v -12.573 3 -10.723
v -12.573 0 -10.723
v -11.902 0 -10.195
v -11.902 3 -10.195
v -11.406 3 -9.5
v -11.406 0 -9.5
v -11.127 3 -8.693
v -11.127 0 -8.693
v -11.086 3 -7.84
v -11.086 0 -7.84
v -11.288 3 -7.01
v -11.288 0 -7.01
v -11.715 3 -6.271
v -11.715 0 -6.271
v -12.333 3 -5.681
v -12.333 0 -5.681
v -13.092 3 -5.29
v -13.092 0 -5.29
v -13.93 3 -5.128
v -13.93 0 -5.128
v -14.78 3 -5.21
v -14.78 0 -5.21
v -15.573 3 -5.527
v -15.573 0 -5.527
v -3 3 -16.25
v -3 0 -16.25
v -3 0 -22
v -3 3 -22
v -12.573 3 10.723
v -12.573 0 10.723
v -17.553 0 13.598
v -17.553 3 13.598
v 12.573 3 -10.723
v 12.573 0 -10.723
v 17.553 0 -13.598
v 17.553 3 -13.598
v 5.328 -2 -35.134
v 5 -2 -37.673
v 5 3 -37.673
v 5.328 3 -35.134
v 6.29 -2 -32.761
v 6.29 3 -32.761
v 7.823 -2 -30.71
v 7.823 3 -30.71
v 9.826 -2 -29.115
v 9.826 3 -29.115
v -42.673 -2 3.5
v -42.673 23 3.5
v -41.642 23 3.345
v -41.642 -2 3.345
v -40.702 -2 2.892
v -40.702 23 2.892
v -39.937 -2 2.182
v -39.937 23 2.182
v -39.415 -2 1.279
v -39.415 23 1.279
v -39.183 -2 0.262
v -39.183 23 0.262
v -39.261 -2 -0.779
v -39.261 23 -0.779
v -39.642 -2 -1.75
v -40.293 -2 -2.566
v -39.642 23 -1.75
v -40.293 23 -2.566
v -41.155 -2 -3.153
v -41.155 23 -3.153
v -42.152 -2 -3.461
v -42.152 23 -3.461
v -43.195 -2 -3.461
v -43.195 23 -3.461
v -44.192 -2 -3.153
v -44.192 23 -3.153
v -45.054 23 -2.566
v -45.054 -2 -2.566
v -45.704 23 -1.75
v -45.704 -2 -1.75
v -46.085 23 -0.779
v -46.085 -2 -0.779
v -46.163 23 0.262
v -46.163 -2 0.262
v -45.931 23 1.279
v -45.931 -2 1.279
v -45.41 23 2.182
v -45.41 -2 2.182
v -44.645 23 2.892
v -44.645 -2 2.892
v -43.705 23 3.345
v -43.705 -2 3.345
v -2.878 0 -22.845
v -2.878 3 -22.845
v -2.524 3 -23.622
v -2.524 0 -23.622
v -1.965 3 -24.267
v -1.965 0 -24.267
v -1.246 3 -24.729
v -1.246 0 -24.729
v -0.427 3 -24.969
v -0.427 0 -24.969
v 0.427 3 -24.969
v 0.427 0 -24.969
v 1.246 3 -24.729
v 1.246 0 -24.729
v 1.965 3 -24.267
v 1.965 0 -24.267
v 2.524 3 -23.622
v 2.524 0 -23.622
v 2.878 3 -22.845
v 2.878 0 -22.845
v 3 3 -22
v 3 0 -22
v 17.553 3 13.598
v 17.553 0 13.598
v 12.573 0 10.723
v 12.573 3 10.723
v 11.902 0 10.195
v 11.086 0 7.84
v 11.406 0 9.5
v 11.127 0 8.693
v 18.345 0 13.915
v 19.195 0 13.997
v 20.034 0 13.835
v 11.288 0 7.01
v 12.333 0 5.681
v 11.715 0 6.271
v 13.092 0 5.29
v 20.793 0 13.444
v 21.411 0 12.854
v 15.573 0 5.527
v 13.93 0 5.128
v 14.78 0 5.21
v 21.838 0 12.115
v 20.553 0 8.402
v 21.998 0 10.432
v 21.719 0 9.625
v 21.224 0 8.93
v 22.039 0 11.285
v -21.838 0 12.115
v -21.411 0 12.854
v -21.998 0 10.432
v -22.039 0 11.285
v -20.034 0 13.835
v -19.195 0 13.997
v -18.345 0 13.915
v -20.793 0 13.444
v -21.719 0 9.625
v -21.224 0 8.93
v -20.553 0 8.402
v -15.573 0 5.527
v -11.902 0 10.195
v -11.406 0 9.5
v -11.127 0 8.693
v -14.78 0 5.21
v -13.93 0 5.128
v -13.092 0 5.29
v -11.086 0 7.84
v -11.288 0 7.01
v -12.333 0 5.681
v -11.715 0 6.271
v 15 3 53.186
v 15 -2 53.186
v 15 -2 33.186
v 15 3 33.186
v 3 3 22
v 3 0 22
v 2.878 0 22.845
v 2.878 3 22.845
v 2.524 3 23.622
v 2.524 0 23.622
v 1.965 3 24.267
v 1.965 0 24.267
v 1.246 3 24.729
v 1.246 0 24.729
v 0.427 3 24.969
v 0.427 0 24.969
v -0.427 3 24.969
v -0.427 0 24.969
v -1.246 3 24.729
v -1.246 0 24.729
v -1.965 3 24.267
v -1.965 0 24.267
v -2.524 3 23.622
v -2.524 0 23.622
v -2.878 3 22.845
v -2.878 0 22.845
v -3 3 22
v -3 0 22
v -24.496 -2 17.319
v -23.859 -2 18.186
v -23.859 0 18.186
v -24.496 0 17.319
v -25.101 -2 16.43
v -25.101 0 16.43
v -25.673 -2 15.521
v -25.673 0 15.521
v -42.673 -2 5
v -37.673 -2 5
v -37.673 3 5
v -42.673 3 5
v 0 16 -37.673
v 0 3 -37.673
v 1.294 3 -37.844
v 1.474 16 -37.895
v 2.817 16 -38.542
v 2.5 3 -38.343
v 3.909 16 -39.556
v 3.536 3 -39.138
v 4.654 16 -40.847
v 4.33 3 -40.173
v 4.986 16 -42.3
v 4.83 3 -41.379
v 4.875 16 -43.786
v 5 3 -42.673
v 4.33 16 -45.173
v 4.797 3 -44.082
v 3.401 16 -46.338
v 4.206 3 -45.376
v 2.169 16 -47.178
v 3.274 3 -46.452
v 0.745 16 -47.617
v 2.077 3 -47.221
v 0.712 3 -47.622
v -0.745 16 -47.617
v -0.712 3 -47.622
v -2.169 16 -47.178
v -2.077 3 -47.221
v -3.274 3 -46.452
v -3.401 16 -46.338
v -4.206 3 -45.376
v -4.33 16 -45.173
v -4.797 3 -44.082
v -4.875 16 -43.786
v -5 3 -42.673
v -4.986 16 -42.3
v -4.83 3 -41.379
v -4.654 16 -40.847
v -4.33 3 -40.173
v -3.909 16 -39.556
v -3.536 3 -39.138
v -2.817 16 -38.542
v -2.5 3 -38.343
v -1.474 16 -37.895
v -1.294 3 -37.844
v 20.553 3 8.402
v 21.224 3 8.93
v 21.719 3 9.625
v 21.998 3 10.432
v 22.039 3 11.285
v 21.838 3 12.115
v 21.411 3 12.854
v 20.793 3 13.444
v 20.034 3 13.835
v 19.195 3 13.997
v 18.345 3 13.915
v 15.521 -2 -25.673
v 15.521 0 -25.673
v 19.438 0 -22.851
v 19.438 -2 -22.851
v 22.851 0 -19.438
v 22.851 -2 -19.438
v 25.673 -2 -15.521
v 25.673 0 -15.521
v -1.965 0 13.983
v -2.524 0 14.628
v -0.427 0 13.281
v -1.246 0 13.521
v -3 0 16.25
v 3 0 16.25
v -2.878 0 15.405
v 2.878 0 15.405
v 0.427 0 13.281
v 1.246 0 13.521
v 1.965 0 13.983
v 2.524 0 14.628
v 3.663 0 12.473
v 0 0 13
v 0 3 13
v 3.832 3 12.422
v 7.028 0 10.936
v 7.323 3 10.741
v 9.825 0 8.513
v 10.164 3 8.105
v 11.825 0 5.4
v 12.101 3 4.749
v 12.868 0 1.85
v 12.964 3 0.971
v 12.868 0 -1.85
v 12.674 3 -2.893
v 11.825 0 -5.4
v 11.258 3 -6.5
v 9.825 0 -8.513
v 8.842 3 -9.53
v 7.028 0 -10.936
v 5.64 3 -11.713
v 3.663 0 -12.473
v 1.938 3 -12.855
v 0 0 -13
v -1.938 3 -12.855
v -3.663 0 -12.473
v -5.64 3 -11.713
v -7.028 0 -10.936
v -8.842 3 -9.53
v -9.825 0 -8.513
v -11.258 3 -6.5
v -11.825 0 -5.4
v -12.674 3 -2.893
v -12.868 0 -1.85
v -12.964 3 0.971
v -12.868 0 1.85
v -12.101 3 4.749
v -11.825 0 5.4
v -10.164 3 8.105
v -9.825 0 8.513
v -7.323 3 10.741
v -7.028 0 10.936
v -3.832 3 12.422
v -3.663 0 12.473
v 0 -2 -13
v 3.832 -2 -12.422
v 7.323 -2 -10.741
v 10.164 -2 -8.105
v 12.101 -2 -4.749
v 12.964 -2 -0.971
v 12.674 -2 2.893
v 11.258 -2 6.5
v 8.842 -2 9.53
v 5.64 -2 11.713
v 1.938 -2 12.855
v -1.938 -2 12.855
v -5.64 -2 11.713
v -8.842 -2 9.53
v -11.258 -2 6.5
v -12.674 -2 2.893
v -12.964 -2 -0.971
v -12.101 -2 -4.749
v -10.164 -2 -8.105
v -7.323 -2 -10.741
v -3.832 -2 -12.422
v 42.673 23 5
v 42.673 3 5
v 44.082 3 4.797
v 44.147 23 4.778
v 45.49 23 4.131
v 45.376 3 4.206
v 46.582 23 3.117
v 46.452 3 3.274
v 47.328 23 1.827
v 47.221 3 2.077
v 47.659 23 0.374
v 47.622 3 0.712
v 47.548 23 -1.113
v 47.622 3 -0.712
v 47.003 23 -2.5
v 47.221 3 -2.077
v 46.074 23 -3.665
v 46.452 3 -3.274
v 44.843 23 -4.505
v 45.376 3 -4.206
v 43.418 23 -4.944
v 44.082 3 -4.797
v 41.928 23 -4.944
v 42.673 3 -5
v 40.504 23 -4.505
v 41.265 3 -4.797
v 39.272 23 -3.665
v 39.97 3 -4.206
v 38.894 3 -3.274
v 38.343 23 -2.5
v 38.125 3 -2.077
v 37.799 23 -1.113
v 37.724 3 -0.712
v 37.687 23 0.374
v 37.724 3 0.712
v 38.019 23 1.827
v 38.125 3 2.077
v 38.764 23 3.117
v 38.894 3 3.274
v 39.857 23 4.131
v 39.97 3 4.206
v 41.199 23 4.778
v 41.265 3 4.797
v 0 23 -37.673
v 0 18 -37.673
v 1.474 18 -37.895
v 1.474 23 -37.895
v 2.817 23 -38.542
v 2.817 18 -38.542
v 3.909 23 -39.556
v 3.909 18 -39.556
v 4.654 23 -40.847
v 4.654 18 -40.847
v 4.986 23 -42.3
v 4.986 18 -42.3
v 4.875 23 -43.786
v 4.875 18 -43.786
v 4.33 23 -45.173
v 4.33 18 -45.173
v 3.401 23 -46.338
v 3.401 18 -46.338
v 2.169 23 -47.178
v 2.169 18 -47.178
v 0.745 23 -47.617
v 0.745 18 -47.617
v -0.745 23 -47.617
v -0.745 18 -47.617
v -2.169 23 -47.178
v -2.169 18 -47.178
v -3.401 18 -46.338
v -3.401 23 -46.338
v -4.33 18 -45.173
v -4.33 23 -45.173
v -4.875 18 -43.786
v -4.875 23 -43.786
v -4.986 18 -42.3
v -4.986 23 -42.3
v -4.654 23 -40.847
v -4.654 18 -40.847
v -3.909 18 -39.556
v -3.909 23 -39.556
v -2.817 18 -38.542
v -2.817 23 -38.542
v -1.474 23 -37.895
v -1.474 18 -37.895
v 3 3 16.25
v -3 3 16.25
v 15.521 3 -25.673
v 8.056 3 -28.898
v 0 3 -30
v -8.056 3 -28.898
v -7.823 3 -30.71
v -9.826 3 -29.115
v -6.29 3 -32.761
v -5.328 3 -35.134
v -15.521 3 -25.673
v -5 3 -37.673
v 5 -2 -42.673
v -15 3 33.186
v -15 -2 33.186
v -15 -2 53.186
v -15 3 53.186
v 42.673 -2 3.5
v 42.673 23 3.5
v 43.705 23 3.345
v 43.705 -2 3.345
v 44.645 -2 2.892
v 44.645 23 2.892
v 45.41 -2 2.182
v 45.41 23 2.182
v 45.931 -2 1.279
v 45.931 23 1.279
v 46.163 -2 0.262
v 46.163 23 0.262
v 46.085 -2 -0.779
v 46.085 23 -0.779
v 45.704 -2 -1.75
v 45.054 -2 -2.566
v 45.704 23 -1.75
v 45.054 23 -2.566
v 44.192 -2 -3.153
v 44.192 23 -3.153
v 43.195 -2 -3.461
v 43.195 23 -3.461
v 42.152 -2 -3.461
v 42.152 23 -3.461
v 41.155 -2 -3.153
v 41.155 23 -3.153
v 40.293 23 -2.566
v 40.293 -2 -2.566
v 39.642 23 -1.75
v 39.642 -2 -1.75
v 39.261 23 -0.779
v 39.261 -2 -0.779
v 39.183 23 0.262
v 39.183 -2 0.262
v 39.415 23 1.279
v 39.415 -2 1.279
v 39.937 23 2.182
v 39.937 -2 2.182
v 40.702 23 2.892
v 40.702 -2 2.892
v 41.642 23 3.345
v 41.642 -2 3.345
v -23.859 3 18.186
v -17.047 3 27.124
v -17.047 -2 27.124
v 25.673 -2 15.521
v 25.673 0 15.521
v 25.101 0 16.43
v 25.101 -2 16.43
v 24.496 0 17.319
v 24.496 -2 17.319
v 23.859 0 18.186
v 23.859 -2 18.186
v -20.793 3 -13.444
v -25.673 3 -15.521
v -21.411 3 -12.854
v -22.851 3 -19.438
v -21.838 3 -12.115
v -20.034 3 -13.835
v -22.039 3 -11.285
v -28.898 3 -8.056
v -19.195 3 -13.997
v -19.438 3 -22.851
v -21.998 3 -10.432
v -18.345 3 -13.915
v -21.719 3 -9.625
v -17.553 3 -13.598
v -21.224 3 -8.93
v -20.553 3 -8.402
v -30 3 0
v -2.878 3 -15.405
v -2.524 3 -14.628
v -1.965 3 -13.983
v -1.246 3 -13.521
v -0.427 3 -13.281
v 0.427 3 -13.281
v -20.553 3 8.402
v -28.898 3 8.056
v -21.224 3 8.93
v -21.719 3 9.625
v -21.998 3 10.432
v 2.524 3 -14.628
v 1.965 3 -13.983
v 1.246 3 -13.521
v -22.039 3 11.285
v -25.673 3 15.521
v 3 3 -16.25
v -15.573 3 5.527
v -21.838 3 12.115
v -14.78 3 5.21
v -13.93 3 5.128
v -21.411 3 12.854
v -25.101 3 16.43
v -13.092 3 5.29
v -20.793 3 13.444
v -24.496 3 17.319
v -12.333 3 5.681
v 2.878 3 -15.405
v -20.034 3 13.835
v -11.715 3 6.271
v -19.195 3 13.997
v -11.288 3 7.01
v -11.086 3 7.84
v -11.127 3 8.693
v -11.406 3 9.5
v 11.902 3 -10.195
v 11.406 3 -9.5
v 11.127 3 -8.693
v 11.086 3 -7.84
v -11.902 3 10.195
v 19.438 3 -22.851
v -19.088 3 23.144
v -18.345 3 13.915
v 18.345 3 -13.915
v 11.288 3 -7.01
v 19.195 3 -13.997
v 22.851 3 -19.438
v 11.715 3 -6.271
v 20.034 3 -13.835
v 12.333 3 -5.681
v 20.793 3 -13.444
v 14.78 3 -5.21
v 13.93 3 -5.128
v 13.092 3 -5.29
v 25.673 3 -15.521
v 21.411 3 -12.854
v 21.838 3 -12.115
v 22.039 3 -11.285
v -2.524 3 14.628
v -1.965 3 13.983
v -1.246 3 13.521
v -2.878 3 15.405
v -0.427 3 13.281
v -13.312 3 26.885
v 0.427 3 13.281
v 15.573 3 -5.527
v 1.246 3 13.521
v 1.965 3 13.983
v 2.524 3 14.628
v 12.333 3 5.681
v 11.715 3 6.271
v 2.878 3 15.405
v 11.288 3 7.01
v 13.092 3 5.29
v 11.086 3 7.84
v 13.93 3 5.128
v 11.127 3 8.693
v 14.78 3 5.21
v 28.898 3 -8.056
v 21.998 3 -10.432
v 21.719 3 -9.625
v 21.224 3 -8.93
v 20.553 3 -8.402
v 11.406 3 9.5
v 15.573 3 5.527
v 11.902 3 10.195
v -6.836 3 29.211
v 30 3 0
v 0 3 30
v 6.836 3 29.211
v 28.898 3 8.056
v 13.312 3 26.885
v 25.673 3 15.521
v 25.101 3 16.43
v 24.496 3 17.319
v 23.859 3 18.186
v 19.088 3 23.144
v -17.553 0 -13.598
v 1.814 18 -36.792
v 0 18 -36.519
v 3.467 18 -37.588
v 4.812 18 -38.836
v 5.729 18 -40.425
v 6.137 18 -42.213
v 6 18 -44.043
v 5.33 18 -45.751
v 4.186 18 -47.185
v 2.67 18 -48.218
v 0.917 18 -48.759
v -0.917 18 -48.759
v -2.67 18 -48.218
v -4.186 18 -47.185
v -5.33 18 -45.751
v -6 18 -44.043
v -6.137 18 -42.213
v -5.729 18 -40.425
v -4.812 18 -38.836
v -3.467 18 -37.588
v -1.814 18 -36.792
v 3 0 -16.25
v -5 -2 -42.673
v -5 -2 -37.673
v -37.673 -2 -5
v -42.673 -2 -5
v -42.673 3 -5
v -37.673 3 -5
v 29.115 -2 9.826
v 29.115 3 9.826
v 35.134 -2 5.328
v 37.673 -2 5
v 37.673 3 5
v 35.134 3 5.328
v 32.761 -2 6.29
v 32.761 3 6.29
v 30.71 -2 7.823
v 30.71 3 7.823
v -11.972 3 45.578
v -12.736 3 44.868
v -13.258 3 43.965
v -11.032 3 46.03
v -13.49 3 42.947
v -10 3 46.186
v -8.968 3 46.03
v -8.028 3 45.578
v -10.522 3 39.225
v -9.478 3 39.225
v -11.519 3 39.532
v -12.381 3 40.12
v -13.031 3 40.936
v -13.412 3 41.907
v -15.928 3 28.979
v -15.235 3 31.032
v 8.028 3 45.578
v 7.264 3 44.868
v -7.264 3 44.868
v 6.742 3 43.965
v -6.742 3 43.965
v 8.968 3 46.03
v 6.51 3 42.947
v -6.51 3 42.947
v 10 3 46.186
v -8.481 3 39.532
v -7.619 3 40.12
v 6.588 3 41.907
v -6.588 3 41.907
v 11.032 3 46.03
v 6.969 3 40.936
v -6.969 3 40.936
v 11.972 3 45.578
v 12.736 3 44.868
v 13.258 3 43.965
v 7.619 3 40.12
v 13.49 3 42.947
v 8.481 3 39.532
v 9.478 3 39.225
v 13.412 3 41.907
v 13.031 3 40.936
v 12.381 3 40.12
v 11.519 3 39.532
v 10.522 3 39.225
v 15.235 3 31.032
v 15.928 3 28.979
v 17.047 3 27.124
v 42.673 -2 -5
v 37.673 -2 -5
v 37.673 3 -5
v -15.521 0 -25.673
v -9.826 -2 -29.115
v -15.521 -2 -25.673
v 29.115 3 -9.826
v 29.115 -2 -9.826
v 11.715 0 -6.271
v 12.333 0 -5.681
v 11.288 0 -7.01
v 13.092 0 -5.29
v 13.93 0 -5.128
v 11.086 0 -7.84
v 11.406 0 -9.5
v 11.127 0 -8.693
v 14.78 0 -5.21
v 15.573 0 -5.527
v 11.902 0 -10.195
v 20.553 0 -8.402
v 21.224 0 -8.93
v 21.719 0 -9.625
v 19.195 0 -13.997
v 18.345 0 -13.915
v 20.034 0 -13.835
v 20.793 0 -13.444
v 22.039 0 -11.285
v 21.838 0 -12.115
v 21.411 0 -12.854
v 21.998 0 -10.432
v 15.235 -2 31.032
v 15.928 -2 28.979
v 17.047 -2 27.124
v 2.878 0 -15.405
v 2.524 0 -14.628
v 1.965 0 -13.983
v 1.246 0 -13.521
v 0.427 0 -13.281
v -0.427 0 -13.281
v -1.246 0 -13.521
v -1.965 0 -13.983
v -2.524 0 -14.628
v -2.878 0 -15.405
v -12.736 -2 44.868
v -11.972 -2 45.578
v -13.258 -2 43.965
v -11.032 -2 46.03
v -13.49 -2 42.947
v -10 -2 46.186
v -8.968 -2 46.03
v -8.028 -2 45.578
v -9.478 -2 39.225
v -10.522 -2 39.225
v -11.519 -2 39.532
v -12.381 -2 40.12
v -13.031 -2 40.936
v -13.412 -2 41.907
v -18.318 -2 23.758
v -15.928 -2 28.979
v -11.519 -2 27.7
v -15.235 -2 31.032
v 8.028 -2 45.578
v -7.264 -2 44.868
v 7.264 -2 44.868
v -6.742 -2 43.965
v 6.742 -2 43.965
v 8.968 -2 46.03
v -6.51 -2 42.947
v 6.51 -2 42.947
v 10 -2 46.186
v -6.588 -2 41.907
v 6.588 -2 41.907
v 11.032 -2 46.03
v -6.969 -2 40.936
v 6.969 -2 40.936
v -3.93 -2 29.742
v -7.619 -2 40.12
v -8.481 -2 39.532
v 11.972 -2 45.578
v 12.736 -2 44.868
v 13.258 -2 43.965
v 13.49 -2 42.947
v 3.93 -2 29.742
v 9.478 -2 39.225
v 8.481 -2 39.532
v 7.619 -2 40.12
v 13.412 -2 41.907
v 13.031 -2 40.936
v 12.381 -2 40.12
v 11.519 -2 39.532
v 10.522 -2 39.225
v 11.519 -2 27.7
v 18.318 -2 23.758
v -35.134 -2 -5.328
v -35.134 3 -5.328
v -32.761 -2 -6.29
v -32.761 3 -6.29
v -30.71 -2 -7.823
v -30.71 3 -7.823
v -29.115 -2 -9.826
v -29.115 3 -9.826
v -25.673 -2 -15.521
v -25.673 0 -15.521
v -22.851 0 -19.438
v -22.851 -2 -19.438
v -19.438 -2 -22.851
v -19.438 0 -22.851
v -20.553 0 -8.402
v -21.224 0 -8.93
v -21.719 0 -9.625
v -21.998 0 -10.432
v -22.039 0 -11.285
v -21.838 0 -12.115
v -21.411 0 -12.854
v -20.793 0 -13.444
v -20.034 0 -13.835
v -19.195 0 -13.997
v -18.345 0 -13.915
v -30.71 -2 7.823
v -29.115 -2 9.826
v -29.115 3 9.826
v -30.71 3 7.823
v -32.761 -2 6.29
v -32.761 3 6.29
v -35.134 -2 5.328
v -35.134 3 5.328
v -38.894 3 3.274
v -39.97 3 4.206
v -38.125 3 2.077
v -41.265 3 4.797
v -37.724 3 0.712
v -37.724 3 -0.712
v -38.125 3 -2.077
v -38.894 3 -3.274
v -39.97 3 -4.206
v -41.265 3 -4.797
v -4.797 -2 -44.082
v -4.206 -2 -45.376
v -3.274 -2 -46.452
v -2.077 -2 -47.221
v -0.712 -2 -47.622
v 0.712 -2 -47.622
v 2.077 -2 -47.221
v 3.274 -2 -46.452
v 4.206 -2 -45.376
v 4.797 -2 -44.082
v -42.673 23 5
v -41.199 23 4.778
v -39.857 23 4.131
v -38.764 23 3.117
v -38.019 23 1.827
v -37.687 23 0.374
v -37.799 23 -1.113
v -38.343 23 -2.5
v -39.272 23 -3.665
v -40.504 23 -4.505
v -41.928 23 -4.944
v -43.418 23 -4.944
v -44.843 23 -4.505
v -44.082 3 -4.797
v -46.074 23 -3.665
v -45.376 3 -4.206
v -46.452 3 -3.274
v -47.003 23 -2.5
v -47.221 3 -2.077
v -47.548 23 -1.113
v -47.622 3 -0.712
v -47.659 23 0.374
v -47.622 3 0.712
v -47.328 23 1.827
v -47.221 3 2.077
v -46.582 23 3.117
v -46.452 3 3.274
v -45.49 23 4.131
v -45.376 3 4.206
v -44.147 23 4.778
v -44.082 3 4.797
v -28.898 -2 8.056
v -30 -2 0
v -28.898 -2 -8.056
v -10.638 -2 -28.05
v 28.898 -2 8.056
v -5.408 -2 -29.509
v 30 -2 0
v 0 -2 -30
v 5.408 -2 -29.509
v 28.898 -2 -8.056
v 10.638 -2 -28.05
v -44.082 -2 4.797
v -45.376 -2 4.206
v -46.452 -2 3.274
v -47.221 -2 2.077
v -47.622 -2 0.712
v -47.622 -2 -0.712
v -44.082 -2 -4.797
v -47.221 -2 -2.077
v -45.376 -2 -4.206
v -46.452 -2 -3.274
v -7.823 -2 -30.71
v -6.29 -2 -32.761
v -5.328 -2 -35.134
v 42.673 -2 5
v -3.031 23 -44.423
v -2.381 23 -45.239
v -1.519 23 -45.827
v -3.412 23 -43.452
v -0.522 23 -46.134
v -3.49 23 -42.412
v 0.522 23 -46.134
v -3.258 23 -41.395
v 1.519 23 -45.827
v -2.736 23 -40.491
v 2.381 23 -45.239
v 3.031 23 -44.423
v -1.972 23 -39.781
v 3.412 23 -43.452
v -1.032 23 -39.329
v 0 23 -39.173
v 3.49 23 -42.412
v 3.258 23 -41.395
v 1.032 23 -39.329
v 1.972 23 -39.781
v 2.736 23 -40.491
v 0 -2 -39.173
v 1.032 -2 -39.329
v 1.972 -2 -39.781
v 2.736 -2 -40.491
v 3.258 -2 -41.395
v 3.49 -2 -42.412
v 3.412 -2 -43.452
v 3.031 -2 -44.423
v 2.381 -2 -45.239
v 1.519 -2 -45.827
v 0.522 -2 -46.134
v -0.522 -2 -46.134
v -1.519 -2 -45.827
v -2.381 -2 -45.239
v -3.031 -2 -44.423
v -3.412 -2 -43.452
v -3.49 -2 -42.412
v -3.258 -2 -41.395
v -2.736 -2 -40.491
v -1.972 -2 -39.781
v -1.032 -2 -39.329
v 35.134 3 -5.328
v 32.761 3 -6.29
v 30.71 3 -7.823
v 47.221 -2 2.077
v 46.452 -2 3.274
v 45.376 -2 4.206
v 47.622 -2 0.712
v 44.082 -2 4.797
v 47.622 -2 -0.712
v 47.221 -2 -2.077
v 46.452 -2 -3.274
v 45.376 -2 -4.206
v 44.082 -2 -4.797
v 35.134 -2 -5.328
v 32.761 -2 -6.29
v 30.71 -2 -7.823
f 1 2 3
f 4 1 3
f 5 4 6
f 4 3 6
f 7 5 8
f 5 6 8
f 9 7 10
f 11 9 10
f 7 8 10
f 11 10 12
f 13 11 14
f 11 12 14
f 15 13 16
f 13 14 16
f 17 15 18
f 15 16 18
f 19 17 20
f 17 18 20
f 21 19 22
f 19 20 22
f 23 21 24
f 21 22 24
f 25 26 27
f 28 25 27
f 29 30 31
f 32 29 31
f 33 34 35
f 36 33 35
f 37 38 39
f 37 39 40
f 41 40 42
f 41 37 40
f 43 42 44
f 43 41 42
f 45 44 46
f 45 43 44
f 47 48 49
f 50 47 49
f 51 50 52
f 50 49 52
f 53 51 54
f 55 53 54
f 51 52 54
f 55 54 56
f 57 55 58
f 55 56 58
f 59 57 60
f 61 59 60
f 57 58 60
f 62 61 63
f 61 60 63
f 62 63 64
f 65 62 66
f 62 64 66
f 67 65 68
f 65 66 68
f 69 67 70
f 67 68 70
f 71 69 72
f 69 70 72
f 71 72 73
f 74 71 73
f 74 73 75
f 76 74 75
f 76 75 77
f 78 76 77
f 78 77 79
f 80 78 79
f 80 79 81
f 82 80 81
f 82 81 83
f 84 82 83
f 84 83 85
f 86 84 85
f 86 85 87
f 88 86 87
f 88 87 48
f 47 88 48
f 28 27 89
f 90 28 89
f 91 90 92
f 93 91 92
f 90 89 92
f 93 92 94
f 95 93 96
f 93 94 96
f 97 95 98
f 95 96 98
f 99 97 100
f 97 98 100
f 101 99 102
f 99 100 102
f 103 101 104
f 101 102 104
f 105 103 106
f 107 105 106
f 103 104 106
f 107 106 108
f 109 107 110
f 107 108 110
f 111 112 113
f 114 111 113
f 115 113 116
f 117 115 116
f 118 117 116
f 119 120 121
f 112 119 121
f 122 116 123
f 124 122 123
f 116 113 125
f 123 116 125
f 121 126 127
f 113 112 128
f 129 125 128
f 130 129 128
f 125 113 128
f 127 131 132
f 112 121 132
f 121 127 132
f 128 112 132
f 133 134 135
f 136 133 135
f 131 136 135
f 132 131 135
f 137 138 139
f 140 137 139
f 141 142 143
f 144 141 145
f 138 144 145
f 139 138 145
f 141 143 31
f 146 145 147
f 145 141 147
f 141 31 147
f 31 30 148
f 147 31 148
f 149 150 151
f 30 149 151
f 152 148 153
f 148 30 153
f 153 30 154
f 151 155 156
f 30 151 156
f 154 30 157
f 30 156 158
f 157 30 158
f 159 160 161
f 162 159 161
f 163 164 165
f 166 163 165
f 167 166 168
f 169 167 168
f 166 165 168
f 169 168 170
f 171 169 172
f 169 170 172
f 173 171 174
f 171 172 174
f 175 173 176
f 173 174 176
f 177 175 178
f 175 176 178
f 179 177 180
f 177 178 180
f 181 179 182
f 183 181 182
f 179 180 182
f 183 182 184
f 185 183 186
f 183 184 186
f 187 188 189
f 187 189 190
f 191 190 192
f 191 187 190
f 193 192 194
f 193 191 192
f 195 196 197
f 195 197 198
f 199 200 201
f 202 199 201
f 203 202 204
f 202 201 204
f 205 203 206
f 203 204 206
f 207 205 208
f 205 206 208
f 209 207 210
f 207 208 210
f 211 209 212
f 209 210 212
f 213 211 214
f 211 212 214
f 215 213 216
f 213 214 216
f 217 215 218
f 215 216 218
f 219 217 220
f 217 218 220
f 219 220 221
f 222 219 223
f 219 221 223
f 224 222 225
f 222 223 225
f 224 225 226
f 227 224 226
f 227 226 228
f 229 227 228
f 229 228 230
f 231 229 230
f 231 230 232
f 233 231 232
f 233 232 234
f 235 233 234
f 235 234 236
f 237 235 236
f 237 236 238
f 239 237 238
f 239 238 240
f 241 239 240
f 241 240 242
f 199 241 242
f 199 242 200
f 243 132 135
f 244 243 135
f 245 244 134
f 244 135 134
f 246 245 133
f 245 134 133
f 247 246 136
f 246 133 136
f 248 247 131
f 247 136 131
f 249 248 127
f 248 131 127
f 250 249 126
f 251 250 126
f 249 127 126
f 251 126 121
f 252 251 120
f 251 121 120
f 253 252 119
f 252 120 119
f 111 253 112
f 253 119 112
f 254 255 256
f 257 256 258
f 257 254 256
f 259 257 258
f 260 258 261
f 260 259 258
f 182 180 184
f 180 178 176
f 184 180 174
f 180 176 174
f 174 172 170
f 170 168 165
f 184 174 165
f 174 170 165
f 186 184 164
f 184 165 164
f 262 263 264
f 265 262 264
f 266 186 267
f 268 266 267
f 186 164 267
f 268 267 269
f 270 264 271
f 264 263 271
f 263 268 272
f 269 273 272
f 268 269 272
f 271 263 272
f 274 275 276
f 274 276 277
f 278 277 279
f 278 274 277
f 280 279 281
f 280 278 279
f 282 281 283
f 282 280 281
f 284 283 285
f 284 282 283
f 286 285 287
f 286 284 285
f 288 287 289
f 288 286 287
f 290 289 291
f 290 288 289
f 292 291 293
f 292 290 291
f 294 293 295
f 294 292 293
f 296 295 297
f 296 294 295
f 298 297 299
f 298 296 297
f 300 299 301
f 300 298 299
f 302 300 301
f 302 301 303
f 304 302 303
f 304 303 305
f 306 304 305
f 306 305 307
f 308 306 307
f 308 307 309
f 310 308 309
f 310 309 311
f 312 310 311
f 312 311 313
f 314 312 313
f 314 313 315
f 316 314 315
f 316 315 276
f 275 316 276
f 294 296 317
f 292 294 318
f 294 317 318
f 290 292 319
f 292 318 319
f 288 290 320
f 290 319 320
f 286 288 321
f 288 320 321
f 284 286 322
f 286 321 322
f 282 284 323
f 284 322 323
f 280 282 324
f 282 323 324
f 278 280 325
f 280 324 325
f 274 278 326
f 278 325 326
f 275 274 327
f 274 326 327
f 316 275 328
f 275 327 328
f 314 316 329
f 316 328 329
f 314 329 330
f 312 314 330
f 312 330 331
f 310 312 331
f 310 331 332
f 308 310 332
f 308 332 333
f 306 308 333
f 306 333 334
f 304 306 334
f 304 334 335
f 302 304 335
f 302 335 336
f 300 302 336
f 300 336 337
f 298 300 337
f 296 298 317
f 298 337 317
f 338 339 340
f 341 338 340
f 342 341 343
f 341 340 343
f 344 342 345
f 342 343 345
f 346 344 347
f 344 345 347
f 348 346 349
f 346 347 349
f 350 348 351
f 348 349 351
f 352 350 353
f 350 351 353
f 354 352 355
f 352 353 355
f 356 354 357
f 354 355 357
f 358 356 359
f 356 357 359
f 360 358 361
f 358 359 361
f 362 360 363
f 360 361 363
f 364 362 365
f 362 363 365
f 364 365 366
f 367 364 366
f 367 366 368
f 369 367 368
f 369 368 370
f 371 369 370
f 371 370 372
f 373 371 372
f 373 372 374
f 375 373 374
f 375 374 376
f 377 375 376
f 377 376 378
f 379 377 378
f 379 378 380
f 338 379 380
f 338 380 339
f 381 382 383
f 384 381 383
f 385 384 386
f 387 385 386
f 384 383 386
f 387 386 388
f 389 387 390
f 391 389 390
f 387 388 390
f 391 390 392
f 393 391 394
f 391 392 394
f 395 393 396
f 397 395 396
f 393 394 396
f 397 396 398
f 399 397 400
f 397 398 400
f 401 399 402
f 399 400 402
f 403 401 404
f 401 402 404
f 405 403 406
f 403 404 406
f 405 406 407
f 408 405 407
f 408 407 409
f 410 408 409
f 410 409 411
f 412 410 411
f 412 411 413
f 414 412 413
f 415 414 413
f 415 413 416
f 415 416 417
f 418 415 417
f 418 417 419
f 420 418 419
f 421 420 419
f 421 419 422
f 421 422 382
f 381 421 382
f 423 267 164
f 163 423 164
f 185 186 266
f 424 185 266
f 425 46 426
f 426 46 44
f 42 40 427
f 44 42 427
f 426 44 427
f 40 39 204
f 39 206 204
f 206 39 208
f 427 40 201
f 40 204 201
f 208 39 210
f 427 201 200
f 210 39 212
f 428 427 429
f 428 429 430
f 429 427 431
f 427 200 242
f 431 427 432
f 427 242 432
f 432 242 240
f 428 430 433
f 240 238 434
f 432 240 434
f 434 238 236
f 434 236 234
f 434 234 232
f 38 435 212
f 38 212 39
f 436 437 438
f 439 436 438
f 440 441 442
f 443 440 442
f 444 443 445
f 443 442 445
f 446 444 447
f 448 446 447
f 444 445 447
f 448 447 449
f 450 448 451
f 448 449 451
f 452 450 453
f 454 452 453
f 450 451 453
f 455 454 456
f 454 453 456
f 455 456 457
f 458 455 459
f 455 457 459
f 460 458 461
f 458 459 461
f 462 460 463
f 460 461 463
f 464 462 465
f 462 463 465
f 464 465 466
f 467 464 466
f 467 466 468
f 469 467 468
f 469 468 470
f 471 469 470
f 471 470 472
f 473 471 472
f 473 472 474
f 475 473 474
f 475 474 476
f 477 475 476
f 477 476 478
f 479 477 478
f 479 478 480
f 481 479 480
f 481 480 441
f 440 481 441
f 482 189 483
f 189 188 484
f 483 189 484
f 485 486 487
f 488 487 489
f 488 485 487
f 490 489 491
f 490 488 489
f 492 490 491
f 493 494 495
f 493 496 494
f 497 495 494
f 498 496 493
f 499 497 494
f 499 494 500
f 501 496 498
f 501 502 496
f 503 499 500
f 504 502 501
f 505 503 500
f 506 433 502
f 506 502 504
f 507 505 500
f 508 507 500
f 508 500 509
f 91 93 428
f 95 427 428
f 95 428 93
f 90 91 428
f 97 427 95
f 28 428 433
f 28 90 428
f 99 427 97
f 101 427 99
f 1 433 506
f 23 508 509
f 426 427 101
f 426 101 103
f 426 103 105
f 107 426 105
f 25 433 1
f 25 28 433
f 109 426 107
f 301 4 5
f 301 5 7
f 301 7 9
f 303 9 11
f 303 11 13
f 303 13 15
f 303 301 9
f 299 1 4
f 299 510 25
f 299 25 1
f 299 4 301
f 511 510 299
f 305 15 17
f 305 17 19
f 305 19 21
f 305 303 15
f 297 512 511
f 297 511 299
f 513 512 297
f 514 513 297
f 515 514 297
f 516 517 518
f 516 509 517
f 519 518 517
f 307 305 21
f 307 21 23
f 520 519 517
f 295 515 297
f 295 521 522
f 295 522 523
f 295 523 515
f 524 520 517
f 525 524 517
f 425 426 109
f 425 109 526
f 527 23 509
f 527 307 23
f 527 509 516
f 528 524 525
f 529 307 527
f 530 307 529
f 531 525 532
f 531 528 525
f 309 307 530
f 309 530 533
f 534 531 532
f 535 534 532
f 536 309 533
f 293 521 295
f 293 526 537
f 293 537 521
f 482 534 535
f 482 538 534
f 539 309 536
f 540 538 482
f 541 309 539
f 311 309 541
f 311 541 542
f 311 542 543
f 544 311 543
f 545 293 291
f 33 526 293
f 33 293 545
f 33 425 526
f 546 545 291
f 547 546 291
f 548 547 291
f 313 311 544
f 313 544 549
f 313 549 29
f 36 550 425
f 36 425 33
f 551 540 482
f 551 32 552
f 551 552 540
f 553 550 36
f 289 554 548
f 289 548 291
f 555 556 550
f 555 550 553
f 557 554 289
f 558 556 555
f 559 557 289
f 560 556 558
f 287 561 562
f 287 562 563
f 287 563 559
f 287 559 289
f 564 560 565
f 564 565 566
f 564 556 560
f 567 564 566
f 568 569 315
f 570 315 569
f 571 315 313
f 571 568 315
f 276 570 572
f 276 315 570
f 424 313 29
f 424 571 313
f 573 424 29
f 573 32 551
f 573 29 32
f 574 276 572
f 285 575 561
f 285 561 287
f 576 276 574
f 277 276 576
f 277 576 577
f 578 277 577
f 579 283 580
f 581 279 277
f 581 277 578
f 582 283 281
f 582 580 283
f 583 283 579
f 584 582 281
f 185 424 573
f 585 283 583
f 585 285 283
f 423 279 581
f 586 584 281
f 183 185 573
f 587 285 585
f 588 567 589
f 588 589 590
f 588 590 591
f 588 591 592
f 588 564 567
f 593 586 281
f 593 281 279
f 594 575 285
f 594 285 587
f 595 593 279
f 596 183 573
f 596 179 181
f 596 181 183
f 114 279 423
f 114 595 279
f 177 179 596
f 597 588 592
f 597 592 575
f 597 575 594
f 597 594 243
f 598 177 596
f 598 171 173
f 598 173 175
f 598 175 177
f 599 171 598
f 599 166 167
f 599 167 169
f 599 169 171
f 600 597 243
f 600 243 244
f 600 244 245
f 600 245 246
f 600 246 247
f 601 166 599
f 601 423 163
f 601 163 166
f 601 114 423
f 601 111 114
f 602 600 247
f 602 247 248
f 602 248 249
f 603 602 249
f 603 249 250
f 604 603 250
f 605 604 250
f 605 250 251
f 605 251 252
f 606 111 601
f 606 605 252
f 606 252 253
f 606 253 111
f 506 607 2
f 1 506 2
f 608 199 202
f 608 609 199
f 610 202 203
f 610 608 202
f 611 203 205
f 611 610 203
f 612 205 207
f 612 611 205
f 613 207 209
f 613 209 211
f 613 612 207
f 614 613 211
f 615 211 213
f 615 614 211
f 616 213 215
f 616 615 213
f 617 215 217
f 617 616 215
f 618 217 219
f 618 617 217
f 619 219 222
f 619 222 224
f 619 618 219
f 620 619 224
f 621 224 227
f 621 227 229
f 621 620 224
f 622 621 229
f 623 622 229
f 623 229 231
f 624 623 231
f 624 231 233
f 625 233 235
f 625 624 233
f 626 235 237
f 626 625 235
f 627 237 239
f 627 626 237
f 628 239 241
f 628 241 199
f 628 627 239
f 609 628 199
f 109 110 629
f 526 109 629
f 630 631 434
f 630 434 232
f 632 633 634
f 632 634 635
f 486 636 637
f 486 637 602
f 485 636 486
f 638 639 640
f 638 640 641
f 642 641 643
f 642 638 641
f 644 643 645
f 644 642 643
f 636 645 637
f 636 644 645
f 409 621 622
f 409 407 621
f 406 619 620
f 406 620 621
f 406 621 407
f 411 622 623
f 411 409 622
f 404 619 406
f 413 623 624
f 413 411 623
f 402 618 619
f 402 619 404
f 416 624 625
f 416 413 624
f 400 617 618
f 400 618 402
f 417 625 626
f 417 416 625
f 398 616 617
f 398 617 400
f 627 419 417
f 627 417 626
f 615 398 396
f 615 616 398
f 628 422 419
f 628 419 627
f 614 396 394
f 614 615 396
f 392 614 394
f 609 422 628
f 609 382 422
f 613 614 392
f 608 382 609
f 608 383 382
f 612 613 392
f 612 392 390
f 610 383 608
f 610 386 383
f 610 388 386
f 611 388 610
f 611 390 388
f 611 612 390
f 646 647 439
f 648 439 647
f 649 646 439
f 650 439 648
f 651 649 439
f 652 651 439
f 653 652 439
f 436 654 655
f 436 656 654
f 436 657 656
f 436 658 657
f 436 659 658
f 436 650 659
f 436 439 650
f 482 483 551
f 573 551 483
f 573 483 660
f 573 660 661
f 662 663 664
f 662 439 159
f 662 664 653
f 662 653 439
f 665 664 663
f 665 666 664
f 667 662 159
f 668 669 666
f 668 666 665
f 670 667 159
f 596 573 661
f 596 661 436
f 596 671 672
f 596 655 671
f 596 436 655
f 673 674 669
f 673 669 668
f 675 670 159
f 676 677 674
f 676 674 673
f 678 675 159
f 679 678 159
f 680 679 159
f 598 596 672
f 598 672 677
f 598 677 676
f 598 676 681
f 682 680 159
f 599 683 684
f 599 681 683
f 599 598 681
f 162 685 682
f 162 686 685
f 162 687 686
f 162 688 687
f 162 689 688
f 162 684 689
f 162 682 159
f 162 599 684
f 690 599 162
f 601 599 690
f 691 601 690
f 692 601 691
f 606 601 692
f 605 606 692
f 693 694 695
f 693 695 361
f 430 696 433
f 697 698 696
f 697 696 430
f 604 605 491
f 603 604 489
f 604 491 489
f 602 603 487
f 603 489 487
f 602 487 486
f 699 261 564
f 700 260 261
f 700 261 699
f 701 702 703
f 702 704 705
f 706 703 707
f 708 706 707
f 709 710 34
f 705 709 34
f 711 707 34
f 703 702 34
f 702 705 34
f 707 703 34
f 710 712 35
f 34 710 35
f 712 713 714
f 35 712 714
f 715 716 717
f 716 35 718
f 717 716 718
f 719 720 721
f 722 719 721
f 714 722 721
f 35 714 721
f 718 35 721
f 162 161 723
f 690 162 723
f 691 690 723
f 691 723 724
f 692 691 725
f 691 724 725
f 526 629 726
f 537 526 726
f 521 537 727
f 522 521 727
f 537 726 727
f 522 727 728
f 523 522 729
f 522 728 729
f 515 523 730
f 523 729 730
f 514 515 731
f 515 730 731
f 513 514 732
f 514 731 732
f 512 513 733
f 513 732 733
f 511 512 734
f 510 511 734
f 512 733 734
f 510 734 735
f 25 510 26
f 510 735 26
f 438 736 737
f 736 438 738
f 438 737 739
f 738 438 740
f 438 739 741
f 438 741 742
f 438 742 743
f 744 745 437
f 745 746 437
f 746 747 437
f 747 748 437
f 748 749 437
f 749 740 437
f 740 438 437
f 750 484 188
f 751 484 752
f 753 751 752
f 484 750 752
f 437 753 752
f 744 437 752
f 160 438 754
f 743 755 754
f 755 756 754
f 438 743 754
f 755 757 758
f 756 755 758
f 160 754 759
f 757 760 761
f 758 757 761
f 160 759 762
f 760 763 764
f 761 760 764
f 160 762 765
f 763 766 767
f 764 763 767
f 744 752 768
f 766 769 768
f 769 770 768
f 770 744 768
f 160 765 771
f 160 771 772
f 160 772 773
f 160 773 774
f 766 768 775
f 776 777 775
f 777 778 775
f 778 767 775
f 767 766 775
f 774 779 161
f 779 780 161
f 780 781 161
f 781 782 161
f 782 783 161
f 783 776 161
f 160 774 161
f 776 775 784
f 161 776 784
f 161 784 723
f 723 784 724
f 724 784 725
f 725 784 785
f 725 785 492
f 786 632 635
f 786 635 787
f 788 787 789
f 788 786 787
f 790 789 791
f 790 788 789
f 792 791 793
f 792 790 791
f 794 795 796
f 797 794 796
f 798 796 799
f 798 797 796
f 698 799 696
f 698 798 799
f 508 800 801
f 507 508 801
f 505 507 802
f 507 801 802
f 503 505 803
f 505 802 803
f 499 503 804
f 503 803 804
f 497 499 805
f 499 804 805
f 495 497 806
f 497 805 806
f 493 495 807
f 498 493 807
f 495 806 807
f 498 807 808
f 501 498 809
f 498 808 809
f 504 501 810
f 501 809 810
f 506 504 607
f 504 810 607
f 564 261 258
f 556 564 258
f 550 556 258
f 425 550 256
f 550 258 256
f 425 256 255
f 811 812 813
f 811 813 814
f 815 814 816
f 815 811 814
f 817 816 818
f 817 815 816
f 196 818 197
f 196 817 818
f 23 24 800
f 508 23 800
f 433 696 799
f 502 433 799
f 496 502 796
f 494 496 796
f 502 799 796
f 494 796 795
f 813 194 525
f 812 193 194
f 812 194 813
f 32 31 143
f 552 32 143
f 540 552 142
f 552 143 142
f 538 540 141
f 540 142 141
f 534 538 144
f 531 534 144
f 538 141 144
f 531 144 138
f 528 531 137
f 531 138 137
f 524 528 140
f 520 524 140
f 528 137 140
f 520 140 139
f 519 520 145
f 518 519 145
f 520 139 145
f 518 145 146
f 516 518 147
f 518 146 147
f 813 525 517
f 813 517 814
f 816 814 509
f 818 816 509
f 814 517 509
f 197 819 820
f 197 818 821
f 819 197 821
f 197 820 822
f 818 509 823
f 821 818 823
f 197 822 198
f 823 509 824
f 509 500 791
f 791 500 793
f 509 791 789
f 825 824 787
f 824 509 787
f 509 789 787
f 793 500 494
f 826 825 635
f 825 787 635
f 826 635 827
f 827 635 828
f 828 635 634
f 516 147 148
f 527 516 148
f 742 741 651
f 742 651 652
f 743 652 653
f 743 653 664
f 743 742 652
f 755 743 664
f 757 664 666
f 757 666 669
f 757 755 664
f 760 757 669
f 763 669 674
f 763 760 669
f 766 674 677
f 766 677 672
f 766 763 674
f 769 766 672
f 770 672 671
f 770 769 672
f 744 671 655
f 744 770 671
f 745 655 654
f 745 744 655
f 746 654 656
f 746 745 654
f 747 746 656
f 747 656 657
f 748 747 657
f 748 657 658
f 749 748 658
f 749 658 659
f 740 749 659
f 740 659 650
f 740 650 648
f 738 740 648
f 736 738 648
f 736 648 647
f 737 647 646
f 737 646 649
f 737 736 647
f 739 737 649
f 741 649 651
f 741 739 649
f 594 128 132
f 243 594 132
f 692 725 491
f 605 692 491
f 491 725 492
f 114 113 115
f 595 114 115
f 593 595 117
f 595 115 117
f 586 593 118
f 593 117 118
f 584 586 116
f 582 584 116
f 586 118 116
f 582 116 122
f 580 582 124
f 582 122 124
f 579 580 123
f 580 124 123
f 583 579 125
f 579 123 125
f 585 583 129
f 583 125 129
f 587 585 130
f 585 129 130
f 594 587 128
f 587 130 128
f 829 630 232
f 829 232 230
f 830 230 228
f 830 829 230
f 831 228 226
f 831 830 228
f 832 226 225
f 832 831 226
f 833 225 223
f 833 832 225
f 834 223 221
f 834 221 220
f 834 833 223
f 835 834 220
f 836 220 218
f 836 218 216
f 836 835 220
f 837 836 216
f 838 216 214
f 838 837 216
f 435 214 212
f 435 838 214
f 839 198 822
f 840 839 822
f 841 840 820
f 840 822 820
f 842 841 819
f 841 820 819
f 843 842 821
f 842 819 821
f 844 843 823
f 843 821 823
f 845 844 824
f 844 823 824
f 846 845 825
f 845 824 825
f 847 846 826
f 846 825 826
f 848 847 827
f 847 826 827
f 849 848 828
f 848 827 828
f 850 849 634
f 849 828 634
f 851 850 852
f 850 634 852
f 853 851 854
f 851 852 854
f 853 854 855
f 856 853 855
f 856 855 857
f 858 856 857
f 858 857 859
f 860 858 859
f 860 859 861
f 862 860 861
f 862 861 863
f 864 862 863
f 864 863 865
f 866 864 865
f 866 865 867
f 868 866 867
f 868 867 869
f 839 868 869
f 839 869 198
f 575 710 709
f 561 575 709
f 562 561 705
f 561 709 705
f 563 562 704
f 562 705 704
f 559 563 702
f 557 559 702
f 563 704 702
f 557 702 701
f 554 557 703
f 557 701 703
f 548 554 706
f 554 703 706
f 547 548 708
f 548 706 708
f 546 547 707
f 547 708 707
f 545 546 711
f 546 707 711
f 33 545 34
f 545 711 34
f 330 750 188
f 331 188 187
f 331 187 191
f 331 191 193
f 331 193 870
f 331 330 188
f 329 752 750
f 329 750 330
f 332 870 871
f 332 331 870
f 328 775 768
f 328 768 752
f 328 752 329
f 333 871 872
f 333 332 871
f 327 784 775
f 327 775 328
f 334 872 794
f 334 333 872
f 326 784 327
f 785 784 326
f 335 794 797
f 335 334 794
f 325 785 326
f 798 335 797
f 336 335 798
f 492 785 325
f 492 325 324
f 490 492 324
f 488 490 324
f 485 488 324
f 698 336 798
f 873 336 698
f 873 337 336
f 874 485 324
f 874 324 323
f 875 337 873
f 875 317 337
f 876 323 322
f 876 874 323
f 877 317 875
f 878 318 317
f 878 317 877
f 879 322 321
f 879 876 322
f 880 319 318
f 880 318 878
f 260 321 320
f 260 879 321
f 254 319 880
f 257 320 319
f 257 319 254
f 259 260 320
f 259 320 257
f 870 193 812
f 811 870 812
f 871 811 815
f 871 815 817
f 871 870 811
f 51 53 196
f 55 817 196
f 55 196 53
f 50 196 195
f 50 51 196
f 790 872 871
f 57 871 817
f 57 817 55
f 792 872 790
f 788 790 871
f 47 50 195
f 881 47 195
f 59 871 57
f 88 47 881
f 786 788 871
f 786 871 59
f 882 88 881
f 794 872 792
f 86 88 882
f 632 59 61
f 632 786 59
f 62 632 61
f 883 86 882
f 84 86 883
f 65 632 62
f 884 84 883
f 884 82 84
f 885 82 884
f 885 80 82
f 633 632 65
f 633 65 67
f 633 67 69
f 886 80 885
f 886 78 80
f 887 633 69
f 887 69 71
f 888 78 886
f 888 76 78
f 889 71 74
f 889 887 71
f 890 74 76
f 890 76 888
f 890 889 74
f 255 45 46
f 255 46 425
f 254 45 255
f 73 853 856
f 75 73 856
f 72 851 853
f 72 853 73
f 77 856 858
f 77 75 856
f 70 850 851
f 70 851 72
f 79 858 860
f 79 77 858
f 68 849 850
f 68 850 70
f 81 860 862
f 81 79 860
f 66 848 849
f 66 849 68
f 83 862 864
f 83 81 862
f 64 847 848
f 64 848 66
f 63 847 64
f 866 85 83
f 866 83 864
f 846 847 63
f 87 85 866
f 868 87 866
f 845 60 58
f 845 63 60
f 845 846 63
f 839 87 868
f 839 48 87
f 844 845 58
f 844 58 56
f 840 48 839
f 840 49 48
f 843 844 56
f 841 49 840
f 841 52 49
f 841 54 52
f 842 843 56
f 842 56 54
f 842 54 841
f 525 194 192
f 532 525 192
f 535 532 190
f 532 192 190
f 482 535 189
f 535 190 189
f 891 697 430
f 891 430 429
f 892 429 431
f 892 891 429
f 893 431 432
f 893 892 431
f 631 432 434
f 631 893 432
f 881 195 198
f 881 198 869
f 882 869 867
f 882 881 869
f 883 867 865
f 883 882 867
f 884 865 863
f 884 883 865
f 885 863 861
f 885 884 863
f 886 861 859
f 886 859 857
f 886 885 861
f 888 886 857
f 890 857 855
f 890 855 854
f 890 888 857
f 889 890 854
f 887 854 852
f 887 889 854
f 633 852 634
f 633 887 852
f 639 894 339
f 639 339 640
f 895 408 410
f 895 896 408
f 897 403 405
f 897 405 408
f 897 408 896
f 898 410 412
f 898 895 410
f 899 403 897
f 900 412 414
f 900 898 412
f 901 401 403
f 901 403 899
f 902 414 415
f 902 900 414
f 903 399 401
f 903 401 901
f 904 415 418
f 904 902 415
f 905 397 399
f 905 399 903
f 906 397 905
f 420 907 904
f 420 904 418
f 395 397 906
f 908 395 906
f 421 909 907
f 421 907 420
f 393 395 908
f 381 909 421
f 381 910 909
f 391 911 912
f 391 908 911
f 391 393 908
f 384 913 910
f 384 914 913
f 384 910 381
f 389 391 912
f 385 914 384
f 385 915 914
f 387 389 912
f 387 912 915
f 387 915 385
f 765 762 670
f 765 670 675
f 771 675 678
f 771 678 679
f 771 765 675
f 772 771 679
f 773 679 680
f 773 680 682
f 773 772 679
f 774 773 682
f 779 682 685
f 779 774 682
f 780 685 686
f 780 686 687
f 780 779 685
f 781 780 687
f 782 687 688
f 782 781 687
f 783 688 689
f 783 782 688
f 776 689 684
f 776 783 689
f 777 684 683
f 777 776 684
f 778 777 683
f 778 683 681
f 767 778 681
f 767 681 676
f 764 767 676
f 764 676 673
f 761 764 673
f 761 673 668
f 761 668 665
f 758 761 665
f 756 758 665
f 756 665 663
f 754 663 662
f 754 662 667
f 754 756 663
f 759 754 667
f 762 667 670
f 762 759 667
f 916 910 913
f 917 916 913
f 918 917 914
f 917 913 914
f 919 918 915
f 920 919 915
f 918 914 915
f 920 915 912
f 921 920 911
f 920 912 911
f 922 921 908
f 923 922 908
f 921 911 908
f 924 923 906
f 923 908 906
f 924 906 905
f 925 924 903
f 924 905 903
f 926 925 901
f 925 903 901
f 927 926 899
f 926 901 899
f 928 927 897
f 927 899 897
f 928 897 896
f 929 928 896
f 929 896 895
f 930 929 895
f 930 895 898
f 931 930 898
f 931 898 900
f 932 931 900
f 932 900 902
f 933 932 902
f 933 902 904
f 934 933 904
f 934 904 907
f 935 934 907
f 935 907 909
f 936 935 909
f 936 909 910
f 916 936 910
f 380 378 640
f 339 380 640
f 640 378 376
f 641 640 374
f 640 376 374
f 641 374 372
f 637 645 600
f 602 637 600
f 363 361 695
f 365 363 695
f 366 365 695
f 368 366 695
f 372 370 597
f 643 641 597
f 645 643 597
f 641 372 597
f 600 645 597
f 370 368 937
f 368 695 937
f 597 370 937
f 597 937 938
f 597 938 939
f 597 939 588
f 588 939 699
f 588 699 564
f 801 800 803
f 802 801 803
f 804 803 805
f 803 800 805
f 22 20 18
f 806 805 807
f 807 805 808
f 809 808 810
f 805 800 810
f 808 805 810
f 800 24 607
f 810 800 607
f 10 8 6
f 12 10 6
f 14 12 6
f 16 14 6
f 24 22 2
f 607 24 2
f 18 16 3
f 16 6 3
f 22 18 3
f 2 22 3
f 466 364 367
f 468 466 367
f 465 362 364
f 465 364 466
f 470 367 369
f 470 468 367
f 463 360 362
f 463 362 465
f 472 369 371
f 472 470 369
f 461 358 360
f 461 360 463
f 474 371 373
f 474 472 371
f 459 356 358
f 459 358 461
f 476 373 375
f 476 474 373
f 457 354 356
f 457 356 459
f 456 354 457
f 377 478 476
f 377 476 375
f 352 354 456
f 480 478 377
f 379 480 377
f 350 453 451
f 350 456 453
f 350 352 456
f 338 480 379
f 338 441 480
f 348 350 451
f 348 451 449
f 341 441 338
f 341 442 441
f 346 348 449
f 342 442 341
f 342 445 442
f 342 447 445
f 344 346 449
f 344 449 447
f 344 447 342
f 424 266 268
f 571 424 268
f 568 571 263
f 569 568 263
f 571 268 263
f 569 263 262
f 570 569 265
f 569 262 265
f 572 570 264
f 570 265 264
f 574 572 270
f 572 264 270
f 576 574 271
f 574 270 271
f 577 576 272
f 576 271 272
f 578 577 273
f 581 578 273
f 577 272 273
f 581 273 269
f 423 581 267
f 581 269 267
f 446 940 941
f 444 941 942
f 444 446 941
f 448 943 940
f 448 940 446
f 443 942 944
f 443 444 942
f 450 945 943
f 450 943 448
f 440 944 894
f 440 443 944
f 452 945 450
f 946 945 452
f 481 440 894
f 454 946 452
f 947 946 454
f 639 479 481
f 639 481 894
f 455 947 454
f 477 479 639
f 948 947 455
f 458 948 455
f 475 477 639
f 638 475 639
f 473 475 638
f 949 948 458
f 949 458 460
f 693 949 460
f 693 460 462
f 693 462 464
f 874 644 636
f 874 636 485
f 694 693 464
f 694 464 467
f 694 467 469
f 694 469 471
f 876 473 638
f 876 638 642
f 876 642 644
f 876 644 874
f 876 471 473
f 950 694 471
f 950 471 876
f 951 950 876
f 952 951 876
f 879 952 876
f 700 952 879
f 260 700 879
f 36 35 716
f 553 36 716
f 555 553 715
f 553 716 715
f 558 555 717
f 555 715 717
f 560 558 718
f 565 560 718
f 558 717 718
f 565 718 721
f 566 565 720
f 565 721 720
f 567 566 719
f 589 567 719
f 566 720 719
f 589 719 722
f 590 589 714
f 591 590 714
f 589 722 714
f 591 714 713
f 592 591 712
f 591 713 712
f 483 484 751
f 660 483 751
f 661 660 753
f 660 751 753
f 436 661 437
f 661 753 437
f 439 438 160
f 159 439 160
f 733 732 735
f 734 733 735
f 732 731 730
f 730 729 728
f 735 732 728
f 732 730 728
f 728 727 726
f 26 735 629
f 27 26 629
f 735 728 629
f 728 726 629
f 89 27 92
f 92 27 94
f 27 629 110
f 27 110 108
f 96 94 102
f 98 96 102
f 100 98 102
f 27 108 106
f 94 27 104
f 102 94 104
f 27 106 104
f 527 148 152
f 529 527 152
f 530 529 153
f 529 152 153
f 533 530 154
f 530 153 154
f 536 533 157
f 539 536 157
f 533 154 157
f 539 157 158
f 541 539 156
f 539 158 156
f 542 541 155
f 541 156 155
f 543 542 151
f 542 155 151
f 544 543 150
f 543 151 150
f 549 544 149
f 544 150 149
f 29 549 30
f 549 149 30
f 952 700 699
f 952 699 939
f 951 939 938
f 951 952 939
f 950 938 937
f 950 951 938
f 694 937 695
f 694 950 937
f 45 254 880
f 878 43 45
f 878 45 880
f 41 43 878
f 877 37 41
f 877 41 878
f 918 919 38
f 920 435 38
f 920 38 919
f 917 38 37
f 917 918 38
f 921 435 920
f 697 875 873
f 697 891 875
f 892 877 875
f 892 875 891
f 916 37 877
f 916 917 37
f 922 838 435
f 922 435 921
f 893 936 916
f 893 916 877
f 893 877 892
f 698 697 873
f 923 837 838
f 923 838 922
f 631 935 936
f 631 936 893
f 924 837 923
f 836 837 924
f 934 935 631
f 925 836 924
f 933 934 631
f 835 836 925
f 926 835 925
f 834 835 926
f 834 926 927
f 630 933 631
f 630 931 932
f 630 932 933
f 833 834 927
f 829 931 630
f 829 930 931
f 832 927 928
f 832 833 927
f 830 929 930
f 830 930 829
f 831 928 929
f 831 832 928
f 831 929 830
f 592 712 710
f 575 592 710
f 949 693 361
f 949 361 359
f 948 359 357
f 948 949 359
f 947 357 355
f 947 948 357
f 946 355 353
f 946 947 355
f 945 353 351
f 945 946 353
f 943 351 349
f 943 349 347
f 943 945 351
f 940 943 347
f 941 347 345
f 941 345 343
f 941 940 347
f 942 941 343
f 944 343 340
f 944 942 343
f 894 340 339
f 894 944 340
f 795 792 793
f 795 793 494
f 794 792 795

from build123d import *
from build123d.topology import SkipClean

# Parameters (mm, degrees)
ESQUISSE1_R             = 30
ESQUISSE1_R_2           = 13
BOSS_EXTRU_1_DEPTH      = 3
BOSS_EXTRU_2_START      = 2
ESQUISSE2_R             = 30
ESQUISSE2_R_2           = 13
BOSS_EXTRU_2_DEPTH      = 2
BOSS_EXTRU_3_START      = -5
ESQUISSE3_R             = 3.5
BOSS_EXTRU_3_DEPTH      = 5
ESQUISSE4_R             = 5
BOSS_EXTRU_4_DEPTH      = 20
ESQUISSE5_R             = 3.5
ENL_V_MAT_EXTRU_1_DEPTH = 76.67344349


with BuildPart() as part:
    # Esquisse1 → Boss.-Extru.1 (new body)
    with BuildSketch(Plane(origin=(0, 0, 0), x_dir=(1, 0, 0), z_dir=(0, 1, 0))):
        with Locations(Location((0, 0, 0), (0, 0, 270))):
            Circle(ESQUISSE1_R)
        with Locations(Location((0, 0, 0), (0, 0, 270))):
            Circle(ESQUISSE1_R_2, mode=Mode.SUBTRACT)
        with BuildLine():
            Line((-3, 16.25), (-3, 22))
            ThreePointArc((-3, 22), (0, 25), (3, 22))
            Line((3, 22), (3, 16.25))
            ThreePointArc((3, 16.25), (0, 13.25), (-3, 16.25))
        make_face(mode=Mode.SUBTRACT)
        with BuildLine():
            Line((12.572912811, 10.723076211), (17.552558883, 13.598076211))
            ThreePointArc((17.552558883, 13.598076211), (21.650635095, 12.5), (20.552558883, 8.401923789))
            Line((20.552558883, 8.401923789), (15.572912811, 5.526923789))
            ThreePointArc((15.572912811, 5.526923789), (11.4748366, 6.625), (12.572912811, 10.723076211))
        make_face(mode=Mode.SUBTRACT)
        with BuildLine():
            Line((15.572912811, -5.526923789), (20.552558883, -8.401923789))
            ThreePointArc((20.552558883, -8.401923789), (21.650635095, -12.5), (17.552558883, -13.598076211))
            Line((17.552558883, -13.598076211), (12.572912811, -10.723076211))
            ThreePointArc((12.572912811, -10.723076211), (11.4748366, -6.625), (15.572912811, -5.526923789))
        make_face(mode=Mode.SUBTRACT)
        with BuildLine():
            Line((3, -16.25), (3, -22))
            ThreePointArc((3, -22), (0, -25), (-3, -22))
            Line((-3, -22), (-3, -16.25))
            ThreePointArc((-3, -16.25), (0, -13.25), (3, -16.25))
        make_face(mode=Mode.SUBTRACT)
        with BuildLine():
            Line((-12.572912811, -10.723076211), (-17.552558883, -13.598076211))
            ThreePointArc((-17.552558883, -13.598076211), (-21.650635095, -12.5), (-20.552558883, -8.401923789))
            Line((-20.552558883, -8.401923789), (-15.572912811, -5.526923789))
            ThreePointArc((-15.572912811, -5.526923789), (-11.4748366, -6.625), (-12.572912811, -10.723076211))
        make_face(mode=Mode.SUBTRACT)
        with BuildLine():
            Line((-15.572912811, 5.526923789), (-20.552558883, 8.401923789))
            ThreePointArc((-20.552558883, 8.401923789), (-21.650635095, 12.5), (-17.552558883, 13.598076211))
            Line((-17.552558883, 13.598076211), (-12.572912811, 10.723076211))
            ThreePointArc((-12.572912811, 10.723076211), (-11.4748366, 6.625), (-15.572912811, 5.526923789))
        make_face(mode=Mode.SUBTRACT)
    extrude(amount=BOSS_EXTRU_1_DEPTH)

    # Esquisse2 → Boss.-Extru.2 (add)
    with BuildSketch(Plane.XZ.offset(BOSS_EXTRU_2_START)):
        with Locations(Location((0, 0, 0), (0, 0, 270))):
            Circle(ESQUISSE2_R)
        with Locations(Location((0, 0, 0), (0, 0, 270))):
            Circle(ESQUISSE2_R_2, mode=Mode.SUBTRACT)
    extrude(amount=-BOSS_EXTRU_2_DEPTH)

    # Esquisse3 → Boss.-Extru.3 (add)
    # profile 1 of 4: a face of its own
    with SkipClean():  # the faces are left unmerged after this step: merging them gives an invalid solid
        with BuildSketch(Plane(origin=(0, 3, 0), x_dir=(1, 0, 0), z_dir=(0, 1, 0)).offset(BOSS_EXTRU_3_START)):
            with BuildLine():
                Line((-15, -33.185852199), (-15, -53.185852199))
                Line((-15, -53.185852199), (15, -53.185852199))
                Line((15, -53.185852199), (15, -33.185852199))
                ThreePointArc((15, -33.185852199), (15.525518495, -29.986758544), (17.046840042, -27.123901466))
                Line((17.046840042, -27.123901466), (23.859479873, -18.185852199))
                ThreePointArc((23.859479873, -18.185852199), (0, -30), (-23.859479873, -18.185852199))
                Line((-23.859479873, -18.185852199), (-17.046840042, -27.123901466))
                ThreePointArc((-17.046840042, -27.123901466), (-15.525518495, -29.986758544), (-15, -33.185852199))
            make_face()
            with Locations(Location((-10, -42.685852199, 0), (0, 0, 270))):
                Circle(ESQUISSE3_R, mode=Mode.SUBTRACT)
            with Locations(Location((10, -42.685852199, 0), (0, 0, 270))):
                Circle(ESQUISSE3_R, mode=Mode.SUBTRACT)
        # profile 2 of 4: a face of its own
        with BuildSketch(Plane(origin=(0, 3, 0), x_dir=(1, 0, 0), z_dir=(0, 1, 0)).offset(BOSS_EXTRU_3_START)):
            with BuildLine():
                Line((37.673212347, 5), (42.673212347, 5))
                ThreePointArc((42.673212347, 5), (47.673212347, 0), (42.673212347, -5))
                Line((42.673212347, -5), (37.673212347, -5))
                ThreePointArc((37.673212347, -5), (32.760729603, -6.289804061), (29.115474898, -9.826497342))
                Line((29.115474898, -9.826497342), (25.673212347, -15.520507974))
                ThreePointArc((25.673212347, -15.520507974), (30, 0), (25.673212347, 15.520507974))
                Line((25.673212347, 15.520507974), (29.115474898, 9.826497342))
                ThreePointArc((29.115474898, 9.826497342), (32.760729603, 6.289804061), (37.673212347, 5))
            make_face()
        # profile 3 of 4: a face of its own
        with BuildSketch(Plane(origin=(0, 3, 0), x_dir=(1, 0, 0), z_dir=(0, 1, 0)).offset(BOSS_EXTRU_3_START)):
            with BuildLine():
                Line((-5, 37.673212347), (-5, 42.673212347))
                ThreePointArc((-5, 42.673212347), (0, 47.673212347), (5, 42.673212347))
                Line((5, 42.673212347), (5, 37.673212347))
                ThreePointArc((5, 37.673212347), (6.289804061, 32.760729603), (9.826497342, 29.115474898))
                Line((9.826497342, 29.115474898), (15.520507974, 25.673212347))
                ThreePointArc((15.520507974, 25.673212347), (0, 30), (-15.520507974, 25.673212347))
                Line((-15.520507974, 25.673212347), (-9.826497342, 29.115474898))
                ThreePointArc((-9.826497342, 29.115474898), (-6.289804061, 32.760729603), (-5, 37.673212347))
            make_face()
        # profile 4 of 4: a face of its own
        with BuildSketch(Plane(origin=(0, 3, 0), x_dir=(1, 0, 0), z_dir=(0, 1, 0)).offset(BOSS_EXTRU_3_START)):
            with BuildLine():
                Line((-37.673212347, -5), (-42.673212347, -5))
                ThreePointArc((-42.673212347, -5), (-47.673212347, 0), (-42.673212347, 5))
                Line((-42.673212347, 5), (-37.673212347, 5))
                ThreePointArc((-37.673212347, 5), (-32.760729603, 6.289804061), (-29.115474898, 9.826497342))
                Line((-29.115474898, 9.826497342), (-25.673212347, 15.520507974))
                ThreePointArc((-25.673212347, 15.520507974), (-30, 0), (-25.673212347, -15.520507974))
                Line((-25.673212347, -15.520507974), (-29.115474898, -9.826497342))
                ThreePointArc((-29.115474898, -9.826497342), (-32.760729603, -6.289804061), (-37.673212347, -5))
            make_face()
        extrude(amount=BOSS_EXTRU_3_DEPTH)

    # Esquisse4 → Boss.-Extru.4 (add)
    with SkipClean():  # the faces are left unmerged after this step: merging them gives an invalid solid
        with BuildSketch(Plane(origin=(0, 3, 0), x_dir=(1, 0, 0), z_dir=(0, 1, 0))):
            with Locations(Location((-42.673212347, 0, 0), (0, 0, 270))):
                Circle(ESQUISSE4_R)
            with Locations(Location((42.673212347, 0, 0), (0, 0, 270))):
                Circle(ESQUISSE4_R)
            with Locations(Location((0, 42.673212347, 0), (0, 0, 270))):
                Circle(ESQUISSE4_R)
        extrude(amount=BOSS_EXTRU_4_DEPTH)

    # Esquisse5 → Enlèv. mat.-Extru.1 (cut, through all)
    with SkipClean():  # the faces are left unmerged after this step: merging them gives an invalid solid
        with BuildSketch(Plane(origin=(0, 23, 0), x_dir=(1, 0, 0), z_dir=(0, 1, 0))):
            with Locations(Location((-42.673212347, 0, 0), (0, 0, 270))):
                Circle(ESQUISSE5_R)
            with Locations(Location((42.673212347, 0, 0), (0, 0, 270))):
                Circle(ESQUISSE5_R)
            with Locations(Location((0, 42.673212347, 0), (0, 0, 270))):
                Circle(ESQUISSE5_R)
        extrude(amount=-ENL_V_MAT_EXTRU_1_DEPTH, mode=Mode.SUBTRACT)

    # Esquisse6 → Révolution1 (revolve)
    with SkipClean():  # the faces are left unmerged after this step: merging them gives an invalid solid
        with BuildSketch(Plane.XY.offset(-42.673212347), mode=Mode.PRIVATE) as r_volution1_sk:
            Polygon((5, 16), (6.154700538, 18), (5, 18), align=None)
        revolve(r_volution1_sk.sketch.rotate(Axis((0, -2, -42.673212347), (0, 1, 0)), 270), axis=Axis((0, -2, -42.673212347), (0, 1, 0)))


solid = part.part
